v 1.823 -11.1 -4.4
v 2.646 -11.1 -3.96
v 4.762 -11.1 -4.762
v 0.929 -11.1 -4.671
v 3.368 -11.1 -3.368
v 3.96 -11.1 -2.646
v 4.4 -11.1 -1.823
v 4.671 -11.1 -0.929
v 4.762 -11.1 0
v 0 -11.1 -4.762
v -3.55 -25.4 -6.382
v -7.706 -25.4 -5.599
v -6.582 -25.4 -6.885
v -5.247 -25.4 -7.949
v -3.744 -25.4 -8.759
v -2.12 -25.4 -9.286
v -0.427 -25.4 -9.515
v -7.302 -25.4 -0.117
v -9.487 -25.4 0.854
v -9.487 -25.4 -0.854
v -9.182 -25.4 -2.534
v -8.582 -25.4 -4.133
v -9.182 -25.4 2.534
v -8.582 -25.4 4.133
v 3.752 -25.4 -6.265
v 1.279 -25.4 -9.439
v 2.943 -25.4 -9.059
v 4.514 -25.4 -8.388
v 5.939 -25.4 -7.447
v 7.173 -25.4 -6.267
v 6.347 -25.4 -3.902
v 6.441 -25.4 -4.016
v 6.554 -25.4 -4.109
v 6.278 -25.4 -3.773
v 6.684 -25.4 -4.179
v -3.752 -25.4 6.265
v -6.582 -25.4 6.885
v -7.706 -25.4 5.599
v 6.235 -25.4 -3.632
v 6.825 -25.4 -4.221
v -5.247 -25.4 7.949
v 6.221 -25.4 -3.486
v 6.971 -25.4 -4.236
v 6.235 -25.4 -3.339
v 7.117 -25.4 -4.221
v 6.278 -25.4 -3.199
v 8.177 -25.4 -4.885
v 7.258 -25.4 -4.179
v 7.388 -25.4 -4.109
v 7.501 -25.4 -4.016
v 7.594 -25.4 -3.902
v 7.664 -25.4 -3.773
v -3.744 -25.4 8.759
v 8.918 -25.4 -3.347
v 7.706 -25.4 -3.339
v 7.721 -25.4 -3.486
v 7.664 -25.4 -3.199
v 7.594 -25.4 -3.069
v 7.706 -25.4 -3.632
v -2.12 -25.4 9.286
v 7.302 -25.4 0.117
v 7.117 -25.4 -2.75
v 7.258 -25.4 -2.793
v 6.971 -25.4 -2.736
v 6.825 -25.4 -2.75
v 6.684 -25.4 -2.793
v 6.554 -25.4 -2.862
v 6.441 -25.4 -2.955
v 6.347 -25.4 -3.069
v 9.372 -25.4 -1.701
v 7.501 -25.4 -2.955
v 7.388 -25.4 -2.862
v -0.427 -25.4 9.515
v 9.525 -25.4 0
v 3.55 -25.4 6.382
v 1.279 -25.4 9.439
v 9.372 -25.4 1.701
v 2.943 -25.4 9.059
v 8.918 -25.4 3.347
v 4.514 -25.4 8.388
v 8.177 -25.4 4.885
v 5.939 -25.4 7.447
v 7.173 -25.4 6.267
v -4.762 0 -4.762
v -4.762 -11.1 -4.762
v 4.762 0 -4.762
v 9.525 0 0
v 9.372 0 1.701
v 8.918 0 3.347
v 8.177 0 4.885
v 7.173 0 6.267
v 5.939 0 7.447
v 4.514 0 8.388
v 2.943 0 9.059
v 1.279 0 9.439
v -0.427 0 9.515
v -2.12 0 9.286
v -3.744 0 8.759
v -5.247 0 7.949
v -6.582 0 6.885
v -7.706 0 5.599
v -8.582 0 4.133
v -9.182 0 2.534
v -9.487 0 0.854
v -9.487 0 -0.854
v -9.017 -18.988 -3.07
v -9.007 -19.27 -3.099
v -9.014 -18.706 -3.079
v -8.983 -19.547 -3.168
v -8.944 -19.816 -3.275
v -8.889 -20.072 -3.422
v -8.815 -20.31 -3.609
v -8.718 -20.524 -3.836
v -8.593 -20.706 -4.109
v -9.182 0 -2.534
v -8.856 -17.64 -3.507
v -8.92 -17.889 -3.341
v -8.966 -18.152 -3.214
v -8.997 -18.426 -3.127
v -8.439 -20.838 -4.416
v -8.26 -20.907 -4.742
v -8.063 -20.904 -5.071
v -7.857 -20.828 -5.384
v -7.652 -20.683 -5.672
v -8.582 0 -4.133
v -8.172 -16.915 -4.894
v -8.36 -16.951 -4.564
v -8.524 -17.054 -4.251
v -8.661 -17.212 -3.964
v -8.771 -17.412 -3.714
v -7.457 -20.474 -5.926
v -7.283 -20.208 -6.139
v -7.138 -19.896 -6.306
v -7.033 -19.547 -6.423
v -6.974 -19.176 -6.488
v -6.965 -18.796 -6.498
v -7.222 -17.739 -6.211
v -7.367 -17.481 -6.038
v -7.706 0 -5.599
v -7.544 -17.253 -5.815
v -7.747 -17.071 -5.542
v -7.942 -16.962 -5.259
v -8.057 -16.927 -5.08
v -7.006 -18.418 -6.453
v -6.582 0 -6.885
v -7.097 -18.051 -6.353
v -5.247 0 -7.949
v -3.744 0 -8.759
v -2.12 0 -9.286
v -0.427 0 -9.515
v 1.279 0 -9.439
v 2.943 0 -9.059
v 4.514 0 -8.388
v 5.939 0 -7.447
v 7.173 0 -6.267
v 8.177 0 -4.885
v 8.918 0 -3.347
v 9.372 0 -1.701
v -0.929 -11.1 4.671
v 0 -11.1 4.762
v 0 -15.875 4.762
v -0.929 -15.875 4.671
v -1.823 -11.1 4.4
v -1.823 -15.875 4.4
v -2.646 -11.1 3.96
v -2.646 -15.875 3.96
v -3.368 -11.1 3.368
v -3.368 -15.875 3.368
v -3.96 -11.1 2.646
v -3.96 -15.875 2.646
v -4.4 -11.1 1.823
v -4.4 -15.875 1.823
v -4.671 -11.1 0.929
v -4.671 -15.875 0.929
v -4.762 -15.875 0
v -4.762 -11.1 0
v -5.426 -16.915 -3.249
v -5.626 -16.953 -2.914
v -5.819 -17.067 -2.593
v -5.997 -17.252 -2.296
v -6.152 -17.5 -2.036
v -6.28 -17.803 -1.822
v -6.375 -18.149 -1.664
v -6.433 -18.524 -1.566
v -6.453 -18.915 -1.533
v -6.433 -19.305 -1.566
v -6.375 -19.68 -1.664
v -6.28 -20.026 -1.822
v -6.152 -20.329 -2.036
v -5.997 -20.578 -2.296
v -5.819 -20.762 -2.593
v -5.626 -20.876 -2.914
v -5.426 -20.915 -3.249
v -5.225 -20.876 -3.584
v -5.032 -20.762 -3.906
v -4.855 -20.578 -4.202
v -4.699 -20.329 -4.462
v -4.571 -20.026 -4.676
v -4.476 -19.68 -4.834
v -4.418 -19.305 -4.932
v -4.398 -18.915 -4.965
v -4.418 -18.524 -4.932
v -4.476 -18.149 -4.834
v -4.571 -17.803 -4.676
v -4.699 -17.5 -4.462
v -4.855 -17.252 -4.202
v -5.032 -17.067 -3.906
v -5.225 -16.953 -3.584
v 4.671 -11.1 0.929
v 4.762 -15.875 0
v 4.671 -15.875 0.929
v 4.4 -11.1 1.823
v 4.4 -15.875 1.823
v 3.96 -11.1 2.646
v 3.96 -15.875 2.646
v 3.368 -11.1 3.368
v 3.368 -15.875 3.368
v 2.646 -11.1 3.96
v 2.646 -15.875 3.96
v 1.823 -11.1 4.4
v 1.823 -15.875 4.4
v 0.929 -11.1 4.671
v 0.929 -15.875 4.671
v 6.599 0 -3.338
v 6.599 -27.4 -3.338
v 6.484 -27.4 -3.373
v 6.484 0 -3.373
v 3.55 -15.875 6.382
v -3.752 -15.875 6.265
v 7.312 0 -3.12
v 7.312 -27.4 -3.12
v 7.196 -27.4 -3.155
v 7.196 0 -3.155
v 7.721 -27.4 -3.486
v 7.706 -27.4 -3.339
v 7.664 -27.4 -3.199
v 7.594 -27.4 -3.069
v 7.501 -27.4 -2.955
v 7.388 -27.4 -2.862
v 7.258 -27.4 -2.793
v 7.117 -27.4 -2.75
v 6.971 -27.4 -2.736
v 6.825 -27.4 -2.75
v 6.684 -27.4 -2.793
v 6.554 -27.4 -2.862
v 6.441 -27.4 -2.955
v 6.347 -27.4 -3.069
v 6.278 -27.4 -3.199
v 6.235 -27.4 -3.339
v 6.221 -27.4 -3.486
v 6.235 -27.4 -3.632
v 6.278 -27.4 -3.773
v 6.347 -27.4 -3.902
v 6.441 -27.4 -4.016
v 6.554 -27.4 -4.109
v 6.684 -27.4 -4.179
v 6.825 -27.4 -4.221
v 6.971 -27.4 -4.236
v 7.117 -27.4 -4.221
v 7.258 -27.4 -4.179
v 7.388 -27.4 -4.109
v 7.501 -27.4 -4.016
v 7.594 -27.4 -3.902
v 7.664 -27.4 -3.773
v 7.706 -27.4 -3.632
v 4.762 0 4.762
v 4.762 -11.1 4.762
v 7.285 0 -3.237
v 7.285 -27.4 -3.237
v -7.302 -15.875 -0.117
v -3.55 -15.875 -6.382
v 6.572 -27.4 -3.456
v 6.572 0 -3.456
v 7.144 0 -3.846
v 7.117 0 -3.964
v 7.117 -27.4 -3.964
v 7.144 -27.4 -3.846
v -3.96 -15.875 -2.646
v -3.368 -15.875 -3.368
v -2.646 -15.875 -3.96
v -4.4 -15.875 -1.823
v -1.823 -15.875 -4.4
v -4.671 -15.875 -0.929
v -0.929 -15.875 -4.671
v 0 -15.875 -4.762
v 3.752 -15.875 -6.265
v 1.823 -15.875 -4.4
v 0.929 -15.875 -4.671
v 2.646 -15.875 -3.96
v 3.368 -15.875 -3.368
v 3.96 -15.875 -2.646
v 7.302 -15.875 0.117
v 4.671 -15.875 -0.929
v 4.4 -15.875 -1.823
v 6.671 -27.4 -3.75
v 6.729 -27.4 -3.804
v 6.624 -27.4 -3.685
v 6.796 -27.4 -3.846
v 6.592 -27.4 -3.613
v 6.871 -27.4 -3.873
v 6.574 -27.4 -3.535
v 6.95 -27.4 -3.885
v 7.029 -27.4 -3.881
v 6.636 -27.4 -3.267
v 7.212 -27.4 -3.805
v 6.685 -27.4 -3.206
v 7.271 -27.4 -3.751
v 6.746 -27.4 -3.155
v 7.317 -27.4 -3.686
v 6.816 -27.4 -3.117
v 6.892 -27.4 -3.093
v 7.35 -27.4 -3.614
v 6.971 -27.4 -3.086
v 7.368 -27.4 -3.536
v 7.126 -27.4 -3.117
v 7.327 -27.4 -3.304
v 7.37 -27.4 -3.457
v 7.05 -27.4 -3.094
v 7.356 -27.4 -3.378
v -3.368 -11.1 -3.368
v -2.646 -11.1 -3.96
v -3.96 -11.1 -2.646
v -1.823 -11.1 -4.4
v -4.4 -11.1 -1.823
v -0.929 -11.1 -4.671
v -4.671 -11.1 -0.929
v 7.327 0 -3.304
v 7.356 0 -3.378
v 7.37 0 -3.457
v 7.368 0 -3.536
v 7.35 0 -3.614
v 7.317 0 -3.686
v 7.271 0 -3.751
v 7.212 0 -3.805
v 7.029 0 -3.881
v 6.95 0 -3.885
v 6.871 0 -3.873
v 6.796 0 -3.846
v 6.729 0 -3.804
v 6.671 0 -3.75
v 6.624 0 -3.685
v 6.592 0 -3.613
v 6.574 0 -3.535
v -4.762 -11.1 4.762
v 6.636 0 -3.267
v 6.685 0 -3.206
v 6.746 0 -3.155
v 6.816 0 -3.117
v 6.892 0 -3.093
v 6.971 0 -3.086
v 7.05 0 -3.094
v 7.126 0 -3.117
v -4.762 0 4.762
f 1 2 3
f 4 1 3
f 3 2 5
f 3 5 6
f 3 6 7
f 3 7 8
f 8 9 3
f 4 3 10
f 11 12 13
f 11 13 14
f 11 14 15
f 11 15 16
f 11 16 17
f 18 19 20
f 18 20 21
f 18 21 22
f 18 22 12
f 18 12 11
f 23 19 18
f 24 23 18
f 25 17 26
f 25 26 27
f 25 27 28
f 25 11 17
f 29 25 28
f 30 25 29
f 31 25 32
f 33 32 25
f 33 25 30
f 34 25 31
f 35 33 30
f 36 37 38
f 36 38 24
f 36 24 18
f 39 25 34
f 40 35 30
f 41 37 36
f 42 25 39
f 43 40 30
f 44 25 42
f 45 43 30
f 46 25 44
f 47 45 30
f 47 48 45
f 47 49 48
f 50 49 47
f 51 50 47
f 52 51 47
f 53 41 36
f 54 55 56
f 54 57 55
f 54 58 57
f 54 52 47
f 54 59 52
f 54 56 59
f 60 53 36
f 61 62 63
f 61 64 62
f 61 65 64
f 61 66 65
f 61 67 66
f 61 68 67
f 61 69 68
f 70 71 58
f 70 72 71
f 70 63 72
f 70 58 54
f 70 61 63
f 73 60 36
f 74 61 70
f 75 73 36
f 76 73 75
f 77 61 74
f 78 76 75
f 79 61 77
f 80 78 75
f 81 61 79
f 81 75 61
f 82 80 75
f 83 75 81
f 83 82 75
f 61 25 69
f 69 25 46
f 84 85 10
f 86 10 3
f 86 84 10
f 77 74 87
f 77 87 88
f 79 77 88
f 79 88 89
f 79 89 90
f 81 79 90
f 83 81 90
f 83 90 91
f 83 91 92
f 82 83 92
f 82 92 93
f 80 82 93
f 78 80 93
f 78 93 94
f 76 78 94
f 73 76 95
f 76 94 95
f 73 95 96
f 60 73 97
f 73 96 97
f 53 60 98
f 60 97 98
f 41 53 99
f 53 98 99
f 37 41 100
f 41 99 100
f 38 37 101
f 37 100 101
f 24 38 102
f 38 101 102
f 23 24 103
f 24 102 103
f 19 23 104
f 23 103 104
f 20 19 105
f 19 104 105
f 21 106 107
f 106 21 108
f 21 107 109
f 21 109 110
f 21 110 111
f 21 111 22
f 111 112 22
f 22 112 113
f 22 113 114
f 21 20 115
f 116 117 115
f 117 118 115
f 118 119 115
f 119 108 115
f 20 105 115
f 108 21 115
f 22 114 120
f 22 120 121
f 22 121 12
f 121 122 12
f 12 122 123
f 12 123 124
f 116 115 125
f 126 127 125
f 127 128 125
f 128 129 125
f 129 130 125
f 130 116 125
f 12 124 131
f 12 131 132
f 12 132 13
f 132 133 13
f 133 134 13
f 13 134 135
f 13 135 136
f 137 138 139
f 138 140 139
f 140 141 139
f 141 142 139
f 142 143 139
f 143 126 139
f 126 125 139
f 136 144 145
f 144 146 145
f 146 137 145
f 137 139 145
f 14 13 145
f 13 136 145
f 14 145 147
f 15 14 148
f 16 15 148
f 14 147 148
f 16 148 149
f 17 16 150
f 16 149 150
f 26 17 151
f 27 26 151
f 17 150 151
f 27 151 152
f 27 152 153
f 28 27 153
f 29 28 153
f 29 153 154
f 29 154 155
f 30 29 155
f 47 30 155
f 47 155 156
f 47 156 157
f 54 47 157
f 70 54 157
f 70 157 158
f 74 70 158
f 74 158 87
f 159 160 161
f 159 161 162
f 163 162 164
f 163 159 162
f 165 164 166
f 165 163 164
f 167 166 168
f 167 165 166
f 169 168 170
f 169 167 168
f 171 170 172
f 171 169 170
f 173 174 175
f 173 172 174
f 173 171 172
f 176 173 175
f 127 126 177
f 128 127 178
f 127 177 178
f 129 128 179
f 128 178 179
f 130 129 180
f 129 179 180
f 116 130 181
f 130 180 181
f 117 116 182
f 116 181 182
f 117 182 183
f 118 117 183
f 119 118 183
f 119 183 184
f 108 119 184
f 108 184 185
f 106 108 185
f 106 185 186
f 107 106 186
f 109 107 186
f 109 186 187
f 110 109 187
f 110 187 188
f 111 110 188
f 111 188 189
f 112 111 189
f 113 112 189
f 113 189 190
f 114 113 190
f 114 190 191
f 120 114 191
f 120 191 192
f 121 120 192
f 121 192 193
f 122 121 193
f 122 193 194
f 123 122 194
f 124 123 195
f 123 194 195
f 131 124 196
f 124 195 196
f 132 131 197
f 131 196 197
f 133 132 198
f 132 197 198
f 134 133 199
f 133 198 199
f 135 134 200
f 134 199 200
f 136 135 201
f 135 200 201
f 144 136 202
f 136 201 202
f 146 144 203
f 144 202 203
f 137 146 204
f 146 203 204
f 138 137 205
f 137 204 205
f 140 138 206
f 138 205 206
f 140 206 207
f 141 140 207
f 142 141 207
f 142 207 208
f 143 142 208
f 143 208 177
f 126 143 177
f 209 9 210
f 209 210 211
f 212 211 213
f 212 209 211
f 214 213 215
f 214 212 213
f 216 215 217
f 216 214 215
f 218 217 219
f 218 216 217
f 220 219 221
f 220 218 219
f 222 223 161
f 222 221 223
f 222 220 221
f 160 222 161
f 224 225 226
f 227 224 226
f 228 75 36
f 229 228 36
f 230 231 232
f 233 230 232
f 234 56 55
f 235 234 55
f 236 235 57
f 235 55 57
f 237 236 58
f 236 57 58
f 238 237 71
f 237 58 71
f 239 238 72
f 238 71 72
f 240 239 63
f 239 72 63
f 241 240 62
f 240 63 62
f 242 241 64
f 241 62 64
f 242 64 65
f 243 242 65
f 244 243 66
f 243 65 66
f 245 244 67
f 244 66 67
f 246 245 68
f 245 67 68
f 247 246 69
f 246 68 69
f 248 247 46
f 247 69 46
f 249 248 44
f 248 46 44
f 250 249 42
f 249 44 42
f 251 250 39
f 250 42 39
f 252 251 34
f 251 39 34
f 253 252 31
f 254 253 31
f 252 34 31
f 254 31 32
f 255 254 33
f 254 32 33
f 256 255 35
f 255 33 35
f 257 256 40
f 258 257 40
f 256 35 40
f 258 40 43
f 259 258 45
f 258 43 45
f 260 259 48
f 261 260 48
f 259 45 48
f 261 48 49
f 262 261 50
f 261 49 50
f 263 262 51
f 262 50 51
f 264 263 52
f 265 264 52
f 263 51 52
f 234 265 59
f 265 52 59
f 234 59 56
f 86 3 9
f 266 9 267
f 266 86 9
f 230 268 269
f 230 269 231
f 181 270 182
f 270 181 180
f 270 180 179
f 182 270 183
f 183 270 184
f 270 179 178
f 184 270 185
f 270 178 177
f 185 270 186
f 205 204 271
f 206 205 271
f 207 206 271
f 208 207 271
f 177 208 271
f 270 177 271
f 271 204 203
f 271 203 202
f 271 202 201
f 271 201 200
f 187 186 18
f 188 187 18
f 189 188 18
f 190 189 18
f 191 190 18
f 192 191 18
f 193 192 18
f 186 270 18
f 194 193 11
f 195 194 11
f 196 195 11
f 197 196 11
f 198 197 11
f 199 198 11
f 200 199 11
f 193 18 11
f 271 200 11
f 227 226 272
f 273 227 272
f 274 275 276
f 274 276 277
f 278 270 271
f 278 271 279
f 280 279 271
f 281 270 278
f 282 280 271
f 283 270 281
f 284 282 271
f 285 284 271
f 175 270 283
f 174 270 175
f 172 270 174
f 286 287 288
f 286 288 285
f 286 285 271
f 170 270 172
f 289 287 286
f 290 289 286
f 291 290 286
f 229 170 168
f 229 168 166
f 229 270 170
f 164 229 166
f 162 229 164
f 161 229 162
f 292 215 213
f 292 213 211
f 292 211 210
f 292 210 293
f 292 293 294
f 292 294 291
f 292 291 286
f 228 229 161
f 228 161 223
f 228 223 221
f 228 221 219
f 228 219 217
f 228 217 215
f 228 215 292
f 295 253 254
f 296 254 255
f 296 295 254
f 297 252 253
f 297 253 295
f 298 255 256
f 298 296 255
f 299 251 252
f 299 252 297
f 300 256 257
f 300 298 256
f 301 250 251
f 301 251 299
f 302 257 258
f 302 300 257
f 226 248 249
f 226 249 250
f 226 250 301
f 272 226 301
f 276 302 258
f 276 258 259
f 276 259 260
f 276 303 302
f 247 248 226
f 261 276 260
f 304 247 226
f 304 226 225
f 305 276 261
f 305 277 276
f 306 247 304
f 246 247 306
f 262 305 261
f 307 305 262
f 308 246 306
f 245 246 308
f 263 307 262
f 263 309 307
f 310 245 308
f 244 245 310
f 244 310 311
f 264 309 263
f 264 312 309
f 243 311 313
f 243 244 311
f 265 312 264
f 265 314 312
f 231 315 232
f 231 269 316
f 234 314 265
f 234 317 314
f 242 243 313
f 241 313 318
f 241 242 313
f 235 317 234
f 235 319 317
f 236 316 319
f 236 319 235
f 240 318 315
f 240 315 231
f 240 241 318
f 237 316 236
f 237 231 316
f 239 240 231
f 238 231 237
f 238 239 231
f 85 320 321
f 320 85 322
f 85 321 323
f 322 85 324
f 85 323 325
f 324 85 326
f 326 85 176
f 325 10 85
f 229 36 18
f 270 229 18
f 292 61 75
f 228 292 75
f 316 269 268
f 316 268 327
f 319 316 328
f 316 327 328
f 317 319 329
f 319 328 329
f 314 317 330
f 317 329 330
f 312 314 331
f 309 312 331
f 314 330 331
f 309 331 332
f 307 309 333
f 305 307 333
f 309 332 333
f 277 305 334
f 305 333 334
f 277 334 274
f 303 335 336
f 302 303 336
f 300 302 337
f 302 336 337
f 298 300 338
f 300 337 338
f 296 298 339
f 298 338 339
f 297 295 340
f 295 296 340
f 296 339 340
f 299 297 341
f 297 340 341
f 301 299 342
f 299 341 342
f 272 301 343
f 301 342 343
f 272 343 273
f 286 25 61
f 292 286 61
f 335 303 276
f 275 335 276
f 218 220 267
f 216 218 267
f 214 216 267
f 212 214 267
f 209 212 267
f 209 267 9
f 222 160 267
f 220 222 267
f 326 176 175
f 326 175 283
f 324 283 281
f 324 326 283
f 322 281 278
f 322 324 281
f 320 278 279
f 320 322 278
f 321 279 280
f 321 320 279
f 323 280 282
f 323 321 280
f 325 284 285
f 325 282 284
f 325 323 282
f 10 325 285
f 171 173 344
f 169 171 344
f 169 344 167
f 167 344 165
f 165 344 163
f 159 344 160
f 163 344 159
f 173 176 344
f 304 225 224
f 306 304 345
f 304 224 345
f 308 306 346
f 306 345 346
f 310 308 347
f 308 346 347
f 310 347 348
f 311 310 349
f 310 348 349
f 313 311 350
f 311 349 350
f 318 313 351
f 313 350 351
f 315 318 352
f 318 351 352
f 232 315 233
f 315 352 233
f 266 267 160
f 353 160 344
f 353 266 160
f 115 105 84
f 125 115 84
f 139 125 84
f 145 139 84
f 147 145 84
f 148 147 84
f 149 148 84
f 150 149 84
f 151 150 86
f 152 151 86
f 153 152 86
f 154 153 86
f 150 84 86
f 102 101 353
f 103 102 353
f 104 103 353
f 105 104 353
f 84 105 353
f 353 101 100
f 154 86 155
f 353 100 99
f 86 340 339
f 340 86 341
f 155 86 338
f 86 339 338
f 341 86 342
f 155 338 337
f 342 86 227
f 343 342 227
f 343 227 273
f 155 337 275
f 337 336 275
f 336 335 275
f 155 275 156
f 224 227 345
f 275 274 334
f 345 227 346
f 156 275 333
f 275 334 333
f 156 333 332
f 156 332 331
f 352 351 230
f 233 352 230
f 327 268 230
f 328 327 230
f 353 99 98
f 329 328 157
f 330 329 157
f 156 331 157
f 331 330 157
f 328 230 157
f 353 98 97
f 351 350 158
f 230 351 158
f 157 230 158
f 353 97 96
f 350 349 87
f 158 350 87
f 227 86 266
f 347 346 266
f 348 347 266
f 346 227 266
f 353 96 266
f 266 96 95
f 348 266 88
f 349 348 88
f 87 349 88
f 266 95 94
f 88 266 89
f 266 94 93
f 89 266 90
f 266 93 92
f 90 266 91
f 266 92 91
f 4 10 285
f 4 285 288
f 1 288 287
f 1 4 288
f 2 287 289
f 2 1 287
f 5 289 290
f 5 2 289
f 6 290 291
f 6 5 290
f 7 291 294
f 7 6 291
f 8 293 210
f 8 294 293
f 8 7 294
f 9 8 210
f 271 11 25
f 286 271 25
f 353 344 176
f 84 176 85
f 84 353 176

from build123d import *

# Parameters (mm, degrees)
F0_R      = 9.525
F1_DEPTH  = 25.4
F3_DEPTH  = 25.401
F4_DEPTH  = 11.0998
F6_DEPTH  = 9.525
F7_R      = 0.75
F8_DEPTH  = 2
F10_DEPTH = 27.401
F11_D     = 0.8
F12_R     = 2
F13_DEPTH = 25


with BuildPart() as f1:
    # F0 (on Front) → F1 (new body)
    with BuildSketch(Plane.XZ):
        Circle(F0_R)
    extrude(amount=F1_DEPTH)

    # F2 (on Front) → F3 (cut, through all)
    with BuildSketch(Plane.XZ):
        with BuildLine():
            ThreePointArc((4.7625, 0), (3.367596, 3.367596), (0, 4.7625))
            ThreePointArc((0, 4.7625), (-3.367596, 3.367596), (-4.7625, 0))
            ThreePointArc((-4.7625, 0), (-3.367596, -3.367596), (0, -4.7625))
            ThreePointArc((0, -4.7625), (3.367596, -3.367596), (4.7625, 0))
        make_face()
    extrude(amount=F3_DEPTH, mode=Mode.SUBTRACT)

    # F2 (on Front) → F4 (cut)
    with BuildSketch(Plane.XZ):
        with BuildLine():
            Line((4.7625, 0), (4.7625, 4.7625))
            Line((4.7625, 4.7625), (0, 4.7625))
            ThreePointArc((0, 4.7625), (3.367596, 3.367596), (4.7625, 0))
        make_face()
        with BuildLine():
            ThreePointArc((-4.7625, 0), (-3.367596, 3.367596), (0, 4.7625))
            Line((0, 4.7625), (-4.7625, 4.7625))
            Line((-4.7625, 4.7625), (-4.7625, 0))
        make_face()
        with BuildLine():
            Line((4.7625, -4.7625), (4.7625, 0))
            ThreePointArc((4.7625, 0), (3.367596, -3.367596), (0, -4.7625))
            Line((0, -4.7625), (4.7625, -4.7625))
        make_face()
        with BuildLine():
            ThreePointArc((0, -4.7625), (-3.367596, -3.367596), (-4.7625, 0))
            Line((-4.7625, 0), (-4.7625, -4.7625))
            Line((-4.7625, -4.7625), (0, -4.7625))
        make_face()
    extrude(amount=F4_DEPTH, mode=Mode.SUBTRACT)

    # F5 (on face) → F6 (cut)
    with BuildSketch(Plane.XZ.offset(25.4)):
        Polygon((7.301568, 0.116642), (3.549769, 6.381665), (-3.751799, 6.265023), (-7.301568, -0.116642), (-3.549769, -6.381665), (3.751799, -6.265023), align=None)
    extrude(amount=-F6_DEPTH, mode=Mode.SUBTRACT)

    # F7 (on face) → F8 (join)
    with BuildSketch(Plane.XZ.offset(25.4)):
        with Locations((6.970895, -3.485664)):
            Circle(F7_R)
    extrude(amount=F8_DEPTH)

    # F9 (on face) → F10 (cut, through all)
    with BuildSketch(Plane.XZ.offset(27.4)):
        Polygon((7.117352, -3.963734), (7.311686, -3.119794), (6.483646, -3.373465), align=None)
    extrude(amount=-F10_DEPTH, mode=Mode.SUBTRACT)

    # F11 (through all)
    with Locations(Plane.XZ.offset(27.4)):
        with Locations((6.970895, -3.485664)):
            Hole(F11_D / 2)

    # F12 (on face) → F13 (cut)
    with BuildSketch(Plane(origin=(-5.425669, 0, -3.249153), x_dir=(0, 1, 0), z_dir=(0.857928, 0, 0.513769))):
        with Locations((-18.914583, 0)):
            Circle(F12_R)
    extrude(amount=-F13_DEPTH, mode=Mode.SUBTRACT)


solid = f1.part
